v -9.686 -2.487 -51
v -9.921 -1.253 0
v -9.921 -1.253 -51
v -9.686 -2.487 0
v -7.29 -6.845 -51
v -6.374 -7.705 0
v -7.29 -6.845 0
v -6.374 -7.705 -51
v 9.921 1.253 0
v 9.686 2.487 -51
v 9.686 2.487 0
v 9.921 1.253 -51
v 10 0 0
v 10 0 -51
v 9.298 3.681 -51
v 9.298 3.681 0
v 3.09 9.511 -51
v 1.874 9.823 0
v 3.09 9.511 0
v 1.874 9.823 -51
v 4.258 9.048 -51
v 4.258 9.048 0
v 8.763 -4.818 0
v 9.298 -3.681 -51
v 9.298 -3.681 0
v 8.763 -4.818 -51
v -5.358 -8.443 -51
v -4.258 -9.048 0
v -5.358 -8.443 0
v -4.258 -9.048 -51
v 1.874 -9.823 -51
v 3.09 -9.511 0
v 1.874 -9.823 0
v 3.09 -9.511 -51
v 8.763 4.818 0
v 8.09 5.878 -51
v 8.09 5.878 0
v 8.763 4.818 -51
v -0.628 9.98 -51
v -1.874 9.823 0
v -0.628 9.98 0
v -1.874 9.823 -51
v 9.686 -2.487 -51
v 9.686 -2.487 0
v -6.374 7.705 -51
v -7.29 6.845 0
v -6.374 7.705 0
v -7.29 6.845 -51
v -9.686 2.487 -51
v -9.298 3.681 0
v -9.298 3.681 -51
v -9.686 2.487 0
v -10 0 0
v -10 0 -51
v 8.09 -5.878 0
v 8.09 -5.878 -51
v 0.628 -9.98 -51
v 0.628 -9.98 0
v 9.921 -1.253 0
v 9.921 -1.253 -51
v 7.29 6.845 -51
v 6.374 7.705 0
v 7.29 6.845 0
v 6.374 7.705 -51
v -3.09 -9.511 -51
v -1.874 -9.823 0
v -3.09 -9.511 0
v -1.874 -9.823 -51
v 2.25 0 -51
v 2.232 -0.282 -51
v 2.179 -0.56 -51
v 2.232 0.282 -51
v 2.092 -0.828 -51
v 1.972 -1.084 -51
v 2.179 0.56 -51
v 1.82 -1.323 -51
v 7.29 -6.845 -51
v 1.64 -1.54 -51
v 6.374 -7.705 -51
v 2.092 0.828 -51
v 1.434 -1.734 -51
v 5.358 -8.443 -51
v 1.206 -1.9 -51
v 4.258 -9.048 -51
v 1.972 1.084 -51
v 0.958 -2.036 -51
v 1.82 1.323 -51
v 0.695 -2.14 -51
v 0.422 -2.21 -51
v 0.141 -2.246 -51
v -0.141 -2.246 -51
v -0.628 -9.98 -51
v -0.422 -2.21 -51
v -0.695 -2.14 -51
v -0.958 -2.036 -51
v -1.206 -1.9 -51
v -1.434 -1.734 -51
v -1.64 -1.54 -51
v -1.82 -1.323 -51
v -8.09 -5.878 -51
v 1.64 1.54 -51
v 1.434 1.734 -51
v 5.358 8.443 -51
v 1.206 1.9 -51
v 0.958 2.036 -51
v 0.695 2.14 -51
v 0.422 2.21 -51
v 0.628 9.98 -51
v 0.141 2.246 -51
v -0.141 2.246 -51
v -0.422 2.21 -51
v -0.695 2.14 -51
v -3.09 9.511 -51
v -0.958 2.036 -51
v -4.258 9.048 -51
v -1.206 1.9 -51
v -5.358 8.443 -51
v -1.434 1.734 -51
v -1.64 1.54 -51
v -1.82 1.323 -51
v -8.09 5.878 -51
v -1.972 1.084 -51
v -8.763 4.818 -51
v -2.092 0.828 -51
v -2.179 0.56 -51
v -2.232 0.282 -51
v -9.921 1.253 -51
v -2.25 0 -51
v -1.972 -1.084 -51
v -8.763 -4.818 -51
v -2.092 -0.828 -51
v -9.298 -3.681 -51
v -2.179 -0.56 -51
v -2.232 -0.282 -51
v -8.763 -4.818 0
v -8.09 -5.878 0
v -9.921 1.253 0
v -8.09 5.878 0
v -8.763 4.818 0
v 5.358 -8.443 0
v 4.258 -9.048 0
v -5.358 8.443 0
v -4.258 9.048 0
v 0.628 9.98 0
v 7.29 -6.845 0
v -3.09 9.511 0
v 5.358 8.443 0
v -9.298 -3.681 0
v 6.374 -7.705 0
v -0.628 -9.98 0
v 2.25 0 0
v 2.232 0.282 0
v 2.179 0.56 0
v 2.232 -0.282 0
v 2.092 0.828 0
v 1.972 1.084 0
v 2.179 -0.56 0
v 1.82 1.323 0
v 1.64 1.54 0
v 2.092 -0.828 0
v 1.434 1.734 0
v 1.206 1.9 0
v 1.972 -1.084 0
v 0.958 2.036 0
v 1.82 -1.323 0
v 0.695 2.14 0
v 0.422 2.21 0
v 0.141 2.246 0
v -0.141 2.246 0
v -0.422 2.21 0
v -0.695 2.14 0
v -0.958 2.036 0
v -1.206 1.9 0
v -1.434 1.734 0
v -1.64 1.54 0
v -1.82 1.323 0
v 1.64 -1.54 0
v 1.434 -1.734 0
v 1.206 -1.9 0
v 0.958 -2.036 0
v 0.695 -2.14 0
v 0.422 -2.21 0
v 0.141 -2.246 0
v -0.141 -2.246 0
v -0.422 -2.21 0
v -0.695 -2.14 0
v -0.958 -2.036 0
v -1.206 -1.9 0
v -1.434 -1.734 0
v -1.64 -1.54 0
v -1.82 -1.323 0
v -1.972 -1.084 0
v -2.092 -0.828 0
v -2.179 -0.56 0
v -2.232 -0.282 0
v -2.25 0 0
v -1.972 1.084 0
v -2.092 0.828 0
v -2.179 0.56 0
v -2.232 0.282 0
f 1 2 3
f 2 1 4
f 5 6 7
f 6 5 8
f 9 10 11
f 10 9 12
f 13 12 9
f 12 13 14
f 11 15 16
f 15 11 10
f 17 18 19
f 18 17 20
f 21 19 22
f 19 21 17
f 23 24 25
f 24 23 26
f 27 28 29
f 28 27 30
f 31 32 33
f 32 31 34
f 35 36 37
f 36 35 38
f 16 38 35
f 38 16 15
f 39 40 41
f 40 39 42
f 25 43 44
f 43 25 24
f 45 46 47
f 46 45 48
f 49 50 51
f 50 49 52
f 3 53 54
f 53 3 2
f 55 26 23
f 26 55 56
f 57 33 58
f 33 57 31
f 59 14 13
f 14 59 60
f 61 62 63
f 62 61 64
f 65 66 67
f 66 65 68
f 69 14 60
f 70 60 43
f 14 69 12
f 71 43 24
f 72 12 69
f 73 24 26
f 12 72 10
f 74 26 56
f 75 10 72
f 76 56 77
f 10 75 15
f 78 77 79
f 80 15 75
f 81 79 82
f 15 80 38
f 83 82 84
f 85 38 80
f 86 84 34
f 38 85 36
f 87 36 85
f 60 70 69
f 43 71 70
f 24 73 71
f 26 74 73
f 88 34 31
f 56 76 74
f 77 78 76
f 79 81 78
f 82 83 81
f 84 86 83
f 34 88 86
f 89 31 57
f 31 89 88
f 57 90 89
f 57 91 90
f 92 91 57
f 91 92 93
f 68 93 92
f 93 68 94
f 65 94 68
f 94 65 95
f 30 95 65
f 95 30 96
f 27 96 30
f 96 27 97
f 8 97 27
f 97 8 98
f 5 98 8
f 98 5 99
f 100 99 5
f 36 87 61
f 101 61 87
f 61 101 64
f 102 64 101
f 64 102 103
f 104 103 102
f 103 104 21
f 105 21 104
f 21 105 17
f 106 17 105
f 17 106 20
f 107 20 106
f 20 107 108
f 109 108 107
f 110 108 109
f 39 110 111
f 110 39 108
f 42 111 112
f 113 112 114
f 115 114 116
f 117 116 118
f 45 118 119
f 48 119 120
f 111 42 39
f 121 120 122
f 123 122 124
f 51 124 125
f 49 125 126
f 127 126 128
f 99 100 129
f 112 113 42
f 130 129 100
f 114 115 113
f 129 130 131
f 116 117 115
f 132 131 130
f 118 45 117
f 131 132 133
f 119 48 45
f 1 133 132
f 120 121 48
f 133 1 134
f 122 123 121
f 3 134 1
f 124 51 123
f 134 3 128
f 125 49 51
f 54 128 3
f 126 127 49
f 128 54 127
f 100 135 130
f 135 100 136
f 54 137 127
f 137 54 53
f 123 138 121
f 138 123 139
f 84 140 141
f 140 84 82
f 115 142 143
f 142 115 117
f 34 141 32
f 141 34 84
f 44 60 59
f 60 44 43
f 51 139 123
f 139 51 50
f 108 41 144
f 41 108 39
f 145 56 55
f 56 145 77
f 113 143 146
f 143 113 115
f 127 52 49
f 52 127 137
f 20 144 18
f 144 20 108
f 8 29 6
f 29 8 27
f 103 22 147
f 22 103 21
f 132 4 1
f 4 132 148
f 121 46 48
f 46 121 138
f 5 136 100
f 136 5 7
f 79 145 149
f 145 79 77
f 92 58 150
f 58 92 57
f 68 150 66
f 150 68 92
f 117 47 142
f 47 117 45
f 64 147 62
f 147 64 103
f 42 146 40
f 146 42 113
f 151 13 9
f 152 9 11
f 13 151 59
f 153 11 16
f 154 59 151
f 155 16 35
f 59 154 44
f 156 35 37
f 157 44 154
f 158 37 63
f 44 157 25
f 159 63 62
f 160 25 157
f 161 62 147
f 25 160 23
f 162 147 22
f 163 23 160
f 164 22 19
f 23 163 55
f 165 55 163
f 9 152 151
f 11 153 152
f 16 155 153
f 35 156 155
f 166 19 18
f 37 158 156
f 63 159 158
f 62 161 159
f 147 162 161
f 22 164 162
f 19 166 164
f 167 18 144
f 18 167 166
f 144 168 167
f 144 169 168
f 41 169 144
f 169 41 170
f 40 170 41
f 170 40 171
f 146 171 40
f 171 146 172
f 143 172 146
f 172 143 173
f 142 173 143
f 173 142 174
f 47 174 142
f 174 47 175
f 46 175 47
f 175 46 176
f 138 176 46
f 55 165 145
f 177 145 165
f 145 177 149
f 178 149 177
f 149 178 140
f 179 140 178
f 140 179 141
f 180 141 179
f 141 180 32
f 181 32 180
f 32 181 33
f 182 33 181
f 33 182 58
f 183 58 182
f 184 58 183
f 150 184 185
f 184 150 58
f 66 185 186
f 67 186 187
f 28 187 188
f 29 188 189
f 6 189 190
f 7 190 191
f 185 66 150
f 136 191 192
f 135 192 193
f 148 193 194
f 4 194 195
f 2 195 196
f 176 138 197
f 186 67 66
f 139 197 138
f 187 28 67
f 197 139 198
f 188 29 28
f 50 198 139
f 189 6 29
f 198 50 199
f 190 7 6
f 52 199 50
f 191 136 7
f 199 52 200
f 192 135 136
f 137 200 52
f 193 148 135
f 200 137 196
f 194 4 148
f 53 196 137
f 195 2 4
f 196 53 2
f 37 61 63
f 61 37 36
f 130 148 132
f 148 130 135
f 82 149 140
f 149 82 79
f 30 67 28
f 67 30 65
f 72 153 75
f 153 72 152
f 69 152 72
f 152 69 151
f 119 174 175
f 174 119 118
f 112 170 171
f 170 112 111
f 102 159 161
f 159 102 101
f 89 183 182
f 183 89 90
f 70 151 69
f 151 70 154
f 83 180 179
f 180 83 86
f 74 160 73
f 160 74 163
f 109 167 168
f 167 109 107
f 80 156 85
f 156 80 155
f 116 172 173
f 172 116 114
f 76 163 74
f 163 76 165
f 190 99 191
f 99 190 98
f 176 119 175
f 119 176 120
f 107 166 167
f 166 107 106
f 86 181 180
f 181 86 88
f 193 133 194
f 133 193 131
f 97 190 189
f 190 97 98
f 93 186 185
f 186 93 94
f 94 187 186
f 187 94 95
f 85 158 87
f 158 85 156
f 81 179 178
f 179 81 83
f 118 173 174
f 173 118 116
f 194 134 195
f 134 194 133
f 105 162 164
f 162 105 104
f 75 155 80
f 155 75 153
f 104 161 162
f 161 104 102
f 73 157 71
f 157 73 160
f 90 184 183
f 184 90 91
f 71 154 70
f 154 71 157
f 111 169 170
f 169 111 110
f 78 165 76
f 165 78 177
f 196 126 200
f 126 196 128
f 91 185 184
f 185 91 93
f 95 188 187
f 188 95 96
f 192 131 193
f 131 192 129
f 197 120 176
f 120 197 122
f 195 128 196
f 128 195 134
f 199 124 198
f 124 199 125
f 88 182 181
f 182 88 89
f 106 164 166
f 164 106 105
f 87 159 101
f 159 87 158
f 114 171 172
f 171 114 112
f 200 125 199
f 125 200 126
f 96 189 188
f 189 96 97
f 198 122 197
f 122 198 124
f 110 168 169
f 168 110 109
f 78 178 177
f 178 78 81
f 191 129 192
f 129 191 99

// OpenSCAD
$fn = 50;


difference() {
	union() {
		translate(v = [0, 0, -51.0000000000]) {
			cylinder(h = 51, r = 10.0000000000);
		}
		cylinder(h = 0, r = 19.0000000000);
	}
	union() {
		#translate(v = [0, 0, -51]) {
			cylinder(h = 51, r = 2.2500000000);
		}
	}
}
